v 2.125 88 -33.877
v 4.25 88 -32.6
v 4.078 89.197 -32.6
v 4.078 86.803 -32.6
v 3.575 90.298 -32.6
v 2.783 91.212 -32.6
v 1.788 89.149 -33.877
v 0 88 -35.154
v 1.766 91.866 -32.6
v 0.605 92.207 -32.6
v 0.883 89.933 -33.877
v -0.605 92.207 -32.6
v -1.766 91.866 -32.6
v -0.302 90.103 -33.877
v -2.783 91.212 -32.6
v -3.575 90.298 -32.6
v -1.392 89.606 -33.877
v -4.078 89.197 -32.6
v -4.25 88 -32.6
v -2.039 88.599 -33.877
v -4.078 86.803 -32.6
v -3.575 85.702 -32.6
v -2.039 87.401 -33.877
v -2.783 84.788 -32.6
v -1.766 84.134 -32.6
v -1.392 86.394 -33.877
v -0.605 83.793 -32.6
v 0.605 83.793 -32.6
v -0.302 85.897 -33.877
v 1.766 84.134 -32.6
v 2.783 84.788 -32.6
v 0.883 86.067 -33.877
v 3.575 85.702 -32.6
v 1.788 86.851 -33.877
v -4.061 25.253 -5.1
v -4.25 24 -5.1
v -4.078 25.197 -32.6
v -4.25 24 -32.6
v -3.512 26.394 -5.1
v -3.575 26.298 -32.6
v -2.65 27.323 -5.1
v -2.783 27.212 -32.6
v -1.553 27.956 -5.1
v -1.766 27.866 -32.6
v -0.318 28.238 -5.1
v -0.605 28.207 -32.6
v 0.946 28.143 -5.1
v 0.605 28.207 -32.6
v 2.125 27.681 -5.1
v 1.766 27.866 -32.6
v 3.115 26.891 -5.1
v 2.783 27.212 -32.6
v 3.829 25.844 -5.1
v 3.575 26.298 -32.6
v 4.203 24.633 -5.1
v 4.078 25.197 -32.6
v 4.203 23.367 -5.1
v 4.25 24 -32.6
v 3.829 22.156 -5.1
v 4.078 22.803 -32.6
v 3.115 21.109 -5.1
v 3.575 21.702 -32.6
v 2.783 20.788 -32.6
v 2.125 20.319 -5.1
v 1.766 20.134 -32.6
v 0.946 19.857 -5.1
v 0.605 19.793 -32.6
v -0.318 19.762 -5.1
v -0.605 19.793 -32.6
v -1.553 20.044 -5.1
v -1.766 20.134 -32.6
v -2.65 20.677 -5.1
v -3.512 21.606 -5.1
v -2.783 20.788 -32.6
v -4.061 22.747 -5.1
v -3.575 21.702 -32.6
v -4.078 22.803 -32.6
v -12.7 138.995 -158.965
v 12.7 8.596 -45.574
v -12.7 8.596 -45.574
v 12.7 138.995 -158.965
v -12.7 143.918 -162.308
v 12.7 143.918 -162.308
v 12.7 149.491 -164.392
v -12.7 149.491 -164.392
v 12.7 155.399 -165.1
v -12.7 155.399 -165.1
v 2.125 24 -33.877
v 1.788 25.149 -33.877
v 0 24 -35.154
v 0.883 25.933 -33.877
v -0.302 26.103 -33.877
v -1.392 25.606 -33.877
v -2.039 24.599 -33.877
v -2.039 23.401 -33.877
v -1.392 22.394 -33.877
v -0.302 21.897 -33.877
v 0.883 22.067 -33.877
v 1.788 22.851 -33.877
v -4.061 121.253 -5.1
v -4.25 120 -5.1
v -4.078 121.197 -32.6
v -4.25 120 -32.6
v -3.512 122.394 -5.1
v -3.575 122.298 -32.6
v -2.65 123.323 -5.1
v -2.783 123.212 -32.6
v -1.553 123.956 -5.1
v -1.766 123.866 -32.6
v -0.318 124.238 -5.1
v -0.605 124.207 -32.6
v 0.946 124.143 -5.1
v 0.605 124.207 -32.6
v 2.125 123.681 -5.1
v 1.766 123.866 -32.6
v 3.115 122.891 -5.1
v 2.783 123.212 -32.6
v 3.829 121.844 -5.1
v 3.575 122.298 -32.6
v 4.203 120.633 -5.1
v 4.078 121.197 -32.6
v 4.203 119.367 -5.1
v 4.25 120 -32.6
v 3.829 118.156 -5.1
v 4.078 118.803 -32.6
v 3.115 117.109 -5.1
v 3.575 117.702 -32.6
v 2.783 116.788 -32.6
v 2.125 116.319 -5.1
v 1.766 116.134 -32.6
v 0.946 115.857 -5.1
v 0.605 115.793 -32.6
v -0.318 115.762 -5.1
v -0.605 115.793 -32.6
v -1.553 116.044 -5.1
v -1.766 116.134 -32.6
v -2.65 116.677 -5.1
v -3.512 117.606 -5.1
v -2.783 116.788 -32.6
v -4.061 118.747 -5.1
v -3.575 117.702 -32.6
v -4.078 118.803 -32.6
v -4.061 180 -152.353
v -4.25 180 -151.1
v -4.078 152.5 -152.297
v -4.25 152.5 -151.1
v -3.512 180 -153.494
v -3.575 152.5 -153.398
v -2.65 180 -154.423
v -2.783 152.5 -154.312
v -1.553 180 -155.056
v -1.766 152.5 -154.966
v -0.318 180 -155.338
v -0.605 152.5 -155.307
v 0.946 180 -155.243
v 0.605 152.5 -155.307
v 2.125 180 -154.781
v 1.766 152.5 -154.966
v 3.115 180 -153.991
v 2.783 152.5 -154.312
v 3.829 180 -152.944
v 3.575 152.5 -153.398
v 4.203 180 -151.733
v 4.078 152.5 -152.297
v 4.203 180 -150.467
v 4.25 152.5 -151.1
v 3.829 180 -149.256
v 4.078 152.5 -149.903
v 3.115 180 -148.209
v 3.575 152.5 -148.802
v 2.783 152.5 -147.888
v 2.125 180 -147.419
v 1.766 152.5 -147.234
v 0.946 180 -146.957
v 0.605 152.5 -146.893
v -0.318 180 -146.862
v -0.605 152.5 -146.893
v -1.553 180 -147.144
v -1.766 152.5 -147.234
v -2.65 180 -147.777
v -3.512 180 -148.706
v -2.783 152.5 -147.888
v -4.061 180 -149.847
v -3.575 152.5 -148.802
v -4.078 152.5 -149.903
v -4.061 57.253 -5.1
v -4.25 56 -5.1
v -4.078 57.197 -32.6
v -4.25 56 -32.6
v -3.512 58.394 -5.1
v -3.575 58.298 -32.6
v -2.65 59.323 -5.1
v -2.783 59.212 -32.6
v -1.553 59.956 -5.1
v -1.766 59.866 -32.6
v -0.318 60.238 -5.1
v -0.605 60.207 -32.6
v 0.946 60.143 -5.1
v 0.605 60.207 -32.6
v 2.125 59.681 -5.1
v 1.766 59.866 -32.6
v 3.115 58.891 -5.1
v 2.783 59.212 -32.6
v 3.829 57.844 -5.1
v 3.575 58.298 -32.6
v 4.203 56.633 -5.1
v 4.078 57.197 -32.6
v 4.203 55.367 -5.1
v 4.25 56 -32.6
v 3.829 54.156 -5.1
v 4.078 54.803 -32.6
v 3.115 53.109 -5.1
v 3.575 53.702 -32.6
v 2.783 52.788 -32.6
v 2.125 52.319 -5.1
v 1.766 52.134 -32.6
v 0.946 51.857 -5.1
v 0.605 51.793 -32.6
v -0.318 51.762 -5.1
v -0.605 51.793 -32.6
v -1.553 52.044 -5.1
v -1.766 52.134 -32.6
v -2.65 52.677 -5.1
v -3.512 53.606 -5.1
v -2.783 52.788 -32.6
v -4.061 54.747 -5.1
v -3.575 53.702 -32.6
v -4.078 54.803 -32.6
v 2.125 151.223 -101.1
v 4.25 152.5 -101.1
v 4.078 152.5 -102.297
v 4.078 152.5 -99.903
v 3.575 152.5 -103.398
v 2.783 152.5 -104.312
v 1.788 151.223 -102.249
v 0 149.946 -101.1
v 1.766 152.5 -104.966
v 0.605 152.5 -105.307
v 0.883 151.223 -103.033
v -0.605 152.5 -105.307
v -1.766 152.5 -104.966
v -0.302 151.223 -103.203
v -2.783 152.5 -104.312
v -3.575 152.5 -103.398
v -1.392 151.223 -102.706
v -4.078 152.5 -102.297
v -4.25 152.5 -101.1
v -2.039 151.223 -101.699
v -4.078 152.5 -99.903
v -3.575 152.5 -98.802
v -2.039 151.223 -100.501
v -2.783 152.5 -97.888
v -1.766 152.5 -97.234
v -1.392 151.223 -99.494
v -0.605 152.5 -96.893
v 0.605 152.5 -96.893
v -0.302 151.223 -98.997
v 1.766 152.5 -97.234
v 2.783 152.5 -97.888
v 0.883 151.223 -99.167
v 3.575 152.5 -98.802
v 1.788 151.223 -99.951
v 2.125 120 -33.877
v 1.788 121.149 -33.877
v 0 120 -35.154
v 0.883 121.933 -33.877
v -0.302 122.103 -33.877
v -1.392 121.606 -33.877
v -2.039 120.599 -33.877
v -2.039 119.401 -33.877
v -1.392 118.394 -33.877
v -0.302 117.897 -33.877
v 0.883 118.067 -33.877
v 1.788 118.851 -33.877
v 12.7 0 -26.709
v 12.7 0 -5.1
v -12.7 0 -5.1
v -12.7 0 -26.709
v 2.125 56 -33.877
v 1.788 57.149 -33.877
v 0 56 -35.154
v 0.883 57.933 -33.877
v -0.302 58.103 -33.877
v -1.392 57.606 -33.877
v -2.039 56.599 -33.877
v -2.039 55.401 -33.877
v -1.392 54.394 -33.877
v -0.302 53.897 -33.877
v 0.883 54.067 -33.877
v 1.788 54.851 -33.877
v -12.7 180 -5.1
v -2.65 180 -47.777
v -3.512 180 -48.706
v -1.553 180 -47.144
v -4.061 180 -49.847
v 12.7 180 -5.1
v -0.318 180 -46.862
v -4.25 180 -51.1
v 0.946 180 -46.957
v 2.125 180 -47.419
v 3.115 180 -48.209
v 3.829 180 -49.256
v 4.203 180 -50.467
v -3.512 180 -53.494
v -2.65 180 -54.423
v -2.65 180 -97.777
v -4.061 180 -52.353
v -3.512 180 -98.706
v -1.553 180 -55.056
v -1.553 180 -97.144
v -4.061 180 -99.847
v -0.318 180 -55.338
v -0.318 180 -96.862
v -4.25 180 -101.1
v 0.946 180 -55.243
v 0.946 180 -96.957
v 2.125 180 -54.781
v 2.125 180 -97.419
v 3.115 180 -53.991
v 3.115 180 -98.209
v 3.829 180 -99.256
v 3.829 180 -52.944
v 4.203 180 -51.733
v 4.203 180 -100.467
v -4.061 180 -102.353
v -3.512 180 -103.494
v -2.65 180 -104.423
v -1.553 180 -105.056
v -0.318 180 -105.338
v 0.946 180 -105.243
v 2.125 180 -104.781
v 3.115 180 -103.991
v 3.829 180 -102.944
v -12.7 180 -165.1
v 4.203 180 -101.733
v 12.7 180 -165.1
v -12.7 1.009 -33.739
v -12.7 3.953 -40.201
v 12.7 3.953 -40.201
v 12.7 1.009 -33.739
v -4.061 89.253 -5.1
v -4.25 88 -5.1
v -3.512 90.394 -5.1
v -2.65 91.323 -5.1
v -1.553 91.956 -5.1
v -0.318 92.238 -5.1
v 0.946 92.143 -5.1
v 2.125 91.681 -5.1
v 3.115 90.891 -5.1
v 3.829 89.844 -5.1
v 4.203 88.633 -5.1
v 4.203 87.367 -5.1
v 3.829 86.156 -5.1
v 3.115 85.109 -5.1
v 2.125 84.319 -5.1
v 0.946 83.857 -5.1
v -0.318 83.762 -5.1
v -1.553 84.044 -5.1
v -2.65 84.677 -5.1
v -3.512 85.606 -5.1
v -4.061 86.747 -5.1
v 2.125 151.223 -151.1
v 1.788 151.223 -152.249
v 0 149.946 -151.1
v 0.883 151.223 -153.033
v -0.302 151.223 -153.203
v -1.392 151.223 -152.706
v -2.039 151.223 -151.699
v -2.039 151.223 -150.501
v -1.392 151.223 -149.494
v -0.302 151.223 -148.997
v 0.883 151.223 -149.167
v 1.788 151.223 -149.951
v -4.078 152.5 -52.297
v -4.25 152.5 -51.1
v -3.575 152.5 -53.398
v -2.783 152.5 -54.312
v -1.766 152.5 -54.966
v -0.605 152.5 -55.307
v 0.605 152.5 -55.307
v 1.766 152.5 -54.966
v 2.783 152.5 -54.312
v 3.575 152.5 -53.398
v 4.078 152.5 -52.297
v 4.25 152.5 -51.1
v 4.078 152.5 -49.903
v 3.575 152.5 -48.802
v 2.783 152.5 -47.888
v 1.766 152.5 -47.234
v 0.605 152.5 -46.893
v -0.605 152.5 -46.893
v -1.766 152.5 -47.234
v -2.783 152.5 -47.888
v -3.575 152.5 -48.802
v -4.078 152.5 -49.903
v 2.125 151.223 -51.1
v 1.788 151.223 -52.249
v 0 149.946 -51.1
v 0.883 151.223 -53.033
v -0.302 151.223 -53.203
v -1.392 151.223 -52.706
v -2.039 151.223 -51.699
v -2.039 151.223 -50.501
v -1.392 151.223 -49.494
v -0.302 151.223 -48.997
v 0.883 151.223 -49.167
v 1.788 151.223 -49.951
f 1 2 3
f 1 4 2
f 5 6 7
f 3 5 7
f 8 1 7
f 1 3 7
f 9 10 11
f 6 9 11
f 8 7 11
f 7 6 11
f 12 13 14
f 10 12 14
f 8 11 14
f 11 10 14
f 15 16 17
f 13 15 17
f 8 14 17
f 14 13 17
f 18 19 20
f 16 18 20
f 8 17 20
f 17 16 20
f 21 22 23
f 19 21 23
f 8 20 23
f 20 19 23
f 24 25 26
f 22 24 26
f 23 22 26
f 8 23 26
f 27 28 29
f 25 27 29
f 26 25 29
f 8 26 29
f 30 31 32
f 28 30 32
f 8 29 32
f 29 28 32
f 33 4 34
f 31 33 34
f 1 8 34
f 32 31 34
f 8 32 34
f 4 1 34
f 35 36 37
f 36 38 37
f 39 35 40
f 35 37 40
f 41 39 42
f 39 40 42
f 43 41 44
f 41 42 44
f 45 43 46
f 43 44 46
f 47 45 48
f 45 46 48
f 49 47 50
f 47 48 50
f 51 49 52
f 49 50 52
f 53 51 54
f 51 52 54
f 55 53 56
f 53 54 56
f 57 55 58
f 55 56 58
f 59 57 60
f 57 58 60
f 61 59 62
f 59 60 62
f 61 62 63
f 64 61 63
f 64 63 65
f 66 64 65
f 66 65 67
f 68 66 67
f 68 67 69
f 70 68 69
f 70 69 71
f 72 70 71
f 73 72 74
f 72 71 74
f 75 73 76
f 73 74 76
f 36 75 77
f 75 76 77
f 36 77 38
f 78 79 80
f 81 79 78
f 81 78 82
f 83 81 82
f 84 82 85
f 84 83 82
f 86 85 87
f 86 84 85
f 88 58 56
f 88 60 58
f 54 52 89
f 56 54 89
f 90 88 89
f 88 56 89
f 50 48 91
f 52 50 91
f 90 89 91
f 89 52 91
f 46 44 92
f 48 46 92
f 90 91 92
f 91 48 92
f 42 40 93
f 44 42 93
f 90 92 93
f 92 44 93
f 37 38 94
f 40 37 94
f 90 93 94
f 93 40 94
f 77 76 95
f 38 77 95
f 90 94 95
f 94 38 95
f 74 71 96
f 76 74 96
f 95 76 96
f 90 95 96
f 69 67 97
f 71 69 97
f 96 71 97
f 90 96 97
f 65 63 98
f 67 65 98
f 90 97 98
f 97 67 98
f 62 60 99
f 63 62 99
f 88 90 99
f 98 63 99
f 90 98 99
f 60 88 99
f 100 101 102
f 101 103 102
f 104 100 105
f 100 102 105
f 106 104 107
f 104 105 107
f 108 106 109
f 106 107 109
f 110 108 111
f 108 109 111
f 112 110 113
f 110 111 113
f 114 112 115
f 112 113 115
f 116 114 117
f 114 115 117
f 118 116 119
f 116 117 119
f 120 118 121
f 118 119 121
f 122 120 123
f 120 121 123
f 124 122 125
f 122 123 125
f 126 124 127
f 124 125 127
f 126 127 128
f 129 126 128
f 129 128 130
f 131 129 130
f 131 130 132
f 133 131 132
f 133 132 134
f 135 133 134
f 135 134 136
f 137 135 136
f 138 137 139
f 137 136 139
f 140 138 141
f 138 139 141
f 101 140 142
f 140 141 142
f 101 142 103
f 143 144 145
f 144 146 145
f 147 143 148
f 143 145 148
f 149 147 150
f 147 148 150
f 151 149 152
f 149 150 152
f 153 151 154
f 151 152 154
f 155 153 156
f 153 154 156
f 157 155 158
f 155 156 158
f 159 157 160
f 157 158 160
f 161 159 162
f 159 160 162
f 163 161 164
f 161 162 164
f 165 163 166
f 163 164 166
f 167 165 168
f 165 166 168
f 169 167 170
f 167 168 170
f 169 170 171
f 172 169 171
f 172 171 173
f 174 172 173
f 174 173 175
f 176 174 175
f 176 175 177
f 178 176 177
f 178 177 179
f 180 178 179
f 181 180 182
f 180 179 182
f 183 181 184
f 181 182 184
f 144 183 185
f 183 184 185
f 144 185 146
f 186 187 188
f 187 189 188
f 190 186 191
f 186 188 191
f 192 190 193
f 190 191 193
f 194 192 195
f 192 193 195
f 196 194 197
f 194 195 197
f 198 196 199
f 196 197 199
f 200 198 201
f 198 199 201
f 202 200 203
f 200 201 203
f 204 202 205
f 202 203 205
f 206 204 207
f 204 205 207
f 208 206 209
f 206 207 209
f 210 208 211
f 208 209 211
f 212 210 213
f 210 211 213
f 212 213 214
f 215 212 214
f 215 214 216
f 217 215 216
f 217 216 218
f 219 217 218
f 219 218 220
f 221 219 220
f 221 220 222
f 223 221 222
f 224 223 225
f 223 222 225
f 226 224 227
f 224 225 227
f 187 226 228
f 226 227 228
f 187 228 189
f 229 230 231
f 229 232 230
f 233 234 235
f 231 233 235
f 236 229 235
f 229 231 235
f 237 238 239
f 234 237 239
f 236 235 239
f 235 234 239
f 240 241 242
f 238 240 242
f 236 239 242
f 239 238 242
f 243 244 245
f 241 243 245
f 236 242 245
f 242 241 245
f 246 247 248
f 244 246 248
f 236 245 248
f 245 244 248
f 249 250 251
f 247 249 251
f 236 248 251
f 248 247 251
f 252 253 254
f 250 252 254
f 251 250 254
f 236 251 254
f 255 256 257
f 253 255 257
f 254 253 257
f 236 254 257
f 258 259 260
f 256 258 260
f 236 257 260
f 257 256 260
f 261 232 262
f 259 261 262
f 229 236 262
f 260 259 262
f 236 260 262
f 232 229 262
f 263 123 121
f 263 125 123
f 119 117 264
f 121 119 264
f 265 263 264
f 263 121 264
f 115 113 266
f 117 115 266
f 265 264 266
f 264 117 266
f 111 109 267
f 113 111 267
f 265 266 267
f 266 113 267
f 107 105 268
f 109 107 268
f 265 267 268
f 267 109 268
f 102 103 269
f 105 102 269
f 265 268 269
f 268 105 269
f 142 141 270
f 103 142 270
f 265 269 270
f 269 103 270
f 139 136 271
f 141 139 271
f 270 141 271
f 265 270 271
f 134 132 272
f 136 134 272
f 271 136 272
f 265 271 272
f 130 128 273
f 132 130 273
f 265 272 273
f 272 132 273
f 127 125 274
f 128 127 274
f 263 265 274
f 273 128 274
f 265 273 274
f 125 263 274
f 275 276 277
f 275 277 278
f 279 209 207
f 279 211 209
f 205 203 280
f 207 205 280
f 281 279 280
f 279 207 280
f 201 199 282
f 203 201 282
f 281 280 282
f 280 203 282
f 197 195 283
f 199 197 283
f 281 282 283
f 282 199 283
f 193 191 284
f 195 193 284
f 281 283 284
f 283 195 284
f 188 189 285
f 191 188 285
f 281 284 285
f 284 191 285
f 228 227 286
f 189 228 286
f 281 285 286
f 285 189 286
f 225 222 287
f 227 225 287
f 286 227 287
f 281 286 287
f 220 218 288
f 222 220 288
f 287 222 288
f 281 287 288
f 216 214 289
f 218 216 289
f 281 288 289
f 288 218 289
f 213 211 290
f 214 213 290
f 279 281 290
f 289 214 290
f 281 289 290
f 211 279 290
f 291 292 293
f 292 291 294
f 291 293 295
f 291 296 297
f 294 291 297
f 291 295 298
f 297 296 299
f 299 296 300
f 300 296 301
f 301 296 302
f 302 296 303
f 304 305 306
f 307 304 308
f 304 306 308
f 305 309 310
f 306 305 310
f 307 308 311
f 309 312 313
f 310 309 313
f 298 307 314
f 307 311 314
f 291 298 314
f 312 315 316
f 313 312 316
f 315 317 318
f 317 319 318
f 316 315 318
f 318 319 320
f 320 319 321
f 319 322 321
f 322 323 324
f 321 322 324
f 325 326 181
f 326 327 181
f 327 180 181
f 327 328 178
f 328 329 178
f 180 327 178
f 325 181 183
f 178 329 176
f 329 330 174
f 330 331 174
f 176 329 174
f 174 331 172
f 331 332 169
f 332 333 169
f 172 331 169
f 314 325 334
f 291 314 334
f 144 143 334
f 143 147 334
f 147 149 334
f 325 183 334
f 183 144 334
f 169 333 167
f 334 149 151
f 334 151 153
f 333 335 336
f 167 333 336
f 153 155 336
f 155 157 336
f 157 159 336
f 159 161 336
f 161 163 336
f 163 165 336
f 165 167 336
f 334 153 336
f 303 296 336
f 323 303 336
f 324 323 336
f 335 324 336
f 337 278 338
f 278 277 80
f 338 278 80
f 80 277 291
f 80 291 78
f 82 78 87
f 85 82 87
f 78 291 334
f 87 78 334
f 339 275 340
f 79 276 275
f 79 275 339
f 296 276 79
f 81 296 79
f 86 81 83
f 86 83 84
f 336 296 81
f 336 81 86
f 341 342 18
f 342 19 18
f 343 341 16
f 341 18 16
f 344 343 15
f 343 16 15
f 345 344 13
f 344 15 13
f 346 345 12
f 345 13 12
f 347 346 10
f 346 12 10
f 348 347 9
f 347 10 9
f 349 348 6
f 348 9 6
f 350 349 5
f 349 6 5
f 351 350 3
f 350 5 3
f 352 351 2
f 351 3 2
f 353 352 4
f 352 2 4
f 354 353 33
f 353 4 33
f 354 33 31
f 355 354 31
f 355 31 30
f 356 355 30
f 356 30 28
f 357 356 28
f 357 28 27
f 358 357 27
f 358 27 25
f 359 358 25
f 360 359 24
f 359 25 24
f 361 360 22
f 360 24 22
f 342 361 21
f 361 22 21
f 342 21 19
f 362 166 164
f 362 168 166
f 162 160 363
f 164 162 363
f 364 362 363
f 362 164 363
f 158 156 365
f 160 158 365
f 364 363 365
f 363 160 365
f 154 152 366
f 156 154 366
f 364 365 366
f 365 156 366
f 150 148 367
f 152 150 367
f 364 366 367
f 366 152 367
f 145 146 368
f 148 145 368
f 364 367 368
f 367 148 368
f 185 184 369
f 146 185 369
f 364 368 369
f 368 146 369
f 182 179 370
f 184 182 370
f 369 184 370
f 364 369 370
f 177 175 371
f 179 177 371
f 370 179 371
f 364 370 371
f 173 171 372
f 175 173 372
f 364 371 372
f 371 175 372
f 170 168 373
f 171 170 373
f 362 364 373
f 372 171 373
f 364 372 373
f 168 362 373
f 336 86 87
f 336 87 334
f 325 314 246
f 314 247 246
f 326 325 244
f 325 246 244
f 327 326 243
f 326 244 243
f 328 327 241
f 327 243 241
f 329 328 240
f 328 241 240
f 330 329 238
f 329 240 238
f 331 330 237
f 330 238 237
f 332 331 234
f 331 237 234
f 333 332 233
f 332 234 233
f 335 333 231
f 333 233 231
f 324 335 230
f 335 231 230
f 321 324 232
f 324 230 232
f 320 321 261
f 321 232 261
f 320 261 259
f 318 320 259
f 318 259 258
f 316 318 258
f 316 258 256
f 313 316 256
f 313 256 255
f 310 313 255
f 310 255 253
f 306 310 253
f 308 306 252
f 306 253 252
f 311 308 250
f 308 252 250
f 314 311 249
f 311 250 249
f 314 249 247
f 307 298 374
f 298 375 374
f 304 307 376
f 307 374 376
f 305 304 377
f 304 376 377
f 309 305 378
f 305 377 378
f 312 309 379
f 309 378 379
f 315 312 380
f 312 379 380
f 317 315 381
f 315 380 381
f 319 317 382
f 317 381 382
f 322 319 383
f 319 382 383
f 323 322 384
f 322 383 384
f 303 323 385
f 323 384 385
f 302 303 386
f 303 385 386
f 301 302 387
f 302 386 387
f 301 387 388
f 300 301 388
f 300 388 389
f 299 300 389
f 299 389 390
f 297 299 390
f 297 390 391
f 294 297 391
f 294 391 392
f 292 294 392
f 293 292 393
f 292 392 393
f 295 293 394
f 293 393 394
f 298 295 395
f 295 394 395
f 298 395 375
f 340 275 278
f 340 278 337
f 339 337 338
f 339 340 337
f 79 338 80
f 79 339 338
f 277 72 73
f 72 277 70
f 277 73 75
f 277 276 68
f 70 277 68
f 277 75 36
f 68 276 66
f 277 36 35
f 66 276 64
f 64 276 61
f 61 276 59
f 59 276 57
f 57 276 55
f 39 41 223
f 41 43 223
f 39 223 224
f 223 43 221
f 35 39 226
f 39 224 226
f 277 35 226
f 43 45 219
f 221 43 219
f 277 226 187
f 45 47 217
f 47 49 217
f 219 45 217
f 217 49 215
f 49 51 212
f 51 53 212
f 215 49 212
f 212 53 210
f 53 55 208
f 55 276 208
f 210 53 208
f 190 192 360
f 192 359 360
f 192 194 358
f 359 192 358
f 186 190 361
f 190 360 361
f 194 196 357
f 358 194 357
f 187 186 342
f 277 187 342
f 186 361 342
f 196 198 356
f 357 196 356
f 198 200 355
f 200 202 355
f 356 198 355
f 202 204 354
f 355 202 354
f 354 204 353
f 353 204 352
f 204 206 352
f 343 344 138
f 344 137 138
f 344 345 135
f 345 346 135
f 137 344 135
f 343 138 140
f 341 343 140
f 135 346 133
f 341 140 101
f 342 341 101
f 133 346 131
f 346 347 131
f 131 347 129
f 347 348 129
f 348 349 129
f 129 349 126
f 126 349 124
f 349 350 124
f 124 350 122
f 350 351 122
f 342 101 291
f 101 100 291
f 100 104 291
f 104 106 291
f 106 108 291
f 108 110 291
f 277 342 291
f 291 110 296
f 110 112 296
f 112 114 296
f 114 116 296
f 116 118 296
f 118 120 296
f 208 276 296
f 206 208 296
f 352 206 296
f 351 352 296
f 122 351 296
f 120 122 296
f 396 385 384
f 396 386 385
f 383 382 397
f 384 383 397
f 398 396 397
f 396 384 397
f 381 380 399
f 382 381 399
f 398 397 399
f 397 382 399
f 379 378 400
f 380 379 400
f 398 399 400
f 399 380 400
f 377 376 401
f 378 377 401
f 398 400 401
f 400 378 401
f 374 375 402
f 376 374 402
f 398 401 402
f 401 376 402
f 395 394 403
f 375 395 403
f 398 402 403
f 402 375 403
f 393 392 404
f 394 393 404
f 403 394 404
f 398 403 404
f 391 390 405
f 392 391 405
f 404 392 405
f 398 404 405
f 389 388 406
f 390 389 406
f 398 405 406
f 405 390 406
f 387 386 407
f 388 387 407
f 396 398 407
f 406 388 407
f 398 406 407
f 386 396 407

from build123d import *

# Parameters (mm, degrees)
BOSS_EXTRUDE1_DEPTH    = 12.7
CUT_EXTRUDE1_DEPTH     = 31.75
M10_TAPPED_HOLE1_D     = 8.5
M10_TAPPED_HOLE1_DEPTH = 27.5
M10_TAPPED_HOLE1_TIP   = 2.553657631
M10_TAPPED_HOLE2_D     = 8.5
M10_TAPPED_HOLE2_DEPTH = 27.5
M10_TAPPED_HOLE2_TIP   = 2.553657631


with BuildPart() as part:
    # Sketch1 → Boss-Extrude1 (new, symmetric)
    with BuildSketch(Plane(origin=(0, 0, 0), x_dir=(0, 0, -1), z_dir=(1, 0, 0))):
        with BuildLine():
            Line((0, 0), (26.709237708, 0))
            ThreePointArc((26.709237708, 0), (37.074764786, 2.250146189), (45.574375763, 8.595532127))
            Line((45.574375763, 8.595532127), (158.965138054, 138.994908762))
            ThreePointArc((158.965138054, 138.994908762), (163.516110387, 146.642335221), (165.1, 155.399376635))
            Line((165.1, 155.399376635), (165.1, 184.15))
            Line((165.1, 184.15), (0, 184.15))
            Line((0, 184.15), (0, 0))
        make_face()
    extrude(amount=BOSS_EXTRUDE1_DEPTH, both=True)

    # Sketch2 → Cut-Extrude1 (cut)
    with BuildSketch(Plane(origin=(12.7, 0, 0), x_dir=(0, 0, -1), z_dir=(1, 0, 0))):
        Polygon((0, 184.15), (0, 0), (5.1, 0), (5.1, 180), (165.1, 180), (165.1, 184.15), align=None)
    extrude(amount=-CUT_EXTRUDE1_DEPTH, mode=Mode.SUBTRACT)

    # M10 Tapped Hole1
    with Locations(Plane(origin=(0, 180, 0), x_dir=(1, 0, 0), z_dir=(0, 1, 0))):
        with Locations((0, 51.100000098), (0, 101.100000098), (0, 151.100000098)):
            Hole(M10_TAPPED_HOLE1_D / 2, depth=M10_TAPPED_HOLE1_DEPTH)
            with Locations((0, 0, -(M10_TAPPED_HOLE1_DEPTH + M10_TAPPED_HOLE1_TIP / 2))):  # 118° drill point
                Cone(0, M10_TAPPED_HOLE1_D / 2, M10_TAPPED_HOLE1_TIP, mode=Mode.SUBTRACT)

    # M10 Tapped Hole2
    with Locations(Plane.XY.offset(-5.1)):
        with Locations((0, 120), (0, 88), (0, 56), (0, 24)):
            Hole(M10_TAPPED_HOLE2_D / 2, depth=M10_TAPPED_HOLE2_DEPTH)
            with Locations((0, 0, -(M10_TAPPED_HOLE2_DEPTH + M10_TAPPED_HOLE2_TIP / 2))):  # 118° drill point
                Cone(0, M10_TAPPED_HOLE2_D / 2, M10_TAPPED_HOLE2_TIP, mode=Mode.SUBTRACT)


solid = part.part
